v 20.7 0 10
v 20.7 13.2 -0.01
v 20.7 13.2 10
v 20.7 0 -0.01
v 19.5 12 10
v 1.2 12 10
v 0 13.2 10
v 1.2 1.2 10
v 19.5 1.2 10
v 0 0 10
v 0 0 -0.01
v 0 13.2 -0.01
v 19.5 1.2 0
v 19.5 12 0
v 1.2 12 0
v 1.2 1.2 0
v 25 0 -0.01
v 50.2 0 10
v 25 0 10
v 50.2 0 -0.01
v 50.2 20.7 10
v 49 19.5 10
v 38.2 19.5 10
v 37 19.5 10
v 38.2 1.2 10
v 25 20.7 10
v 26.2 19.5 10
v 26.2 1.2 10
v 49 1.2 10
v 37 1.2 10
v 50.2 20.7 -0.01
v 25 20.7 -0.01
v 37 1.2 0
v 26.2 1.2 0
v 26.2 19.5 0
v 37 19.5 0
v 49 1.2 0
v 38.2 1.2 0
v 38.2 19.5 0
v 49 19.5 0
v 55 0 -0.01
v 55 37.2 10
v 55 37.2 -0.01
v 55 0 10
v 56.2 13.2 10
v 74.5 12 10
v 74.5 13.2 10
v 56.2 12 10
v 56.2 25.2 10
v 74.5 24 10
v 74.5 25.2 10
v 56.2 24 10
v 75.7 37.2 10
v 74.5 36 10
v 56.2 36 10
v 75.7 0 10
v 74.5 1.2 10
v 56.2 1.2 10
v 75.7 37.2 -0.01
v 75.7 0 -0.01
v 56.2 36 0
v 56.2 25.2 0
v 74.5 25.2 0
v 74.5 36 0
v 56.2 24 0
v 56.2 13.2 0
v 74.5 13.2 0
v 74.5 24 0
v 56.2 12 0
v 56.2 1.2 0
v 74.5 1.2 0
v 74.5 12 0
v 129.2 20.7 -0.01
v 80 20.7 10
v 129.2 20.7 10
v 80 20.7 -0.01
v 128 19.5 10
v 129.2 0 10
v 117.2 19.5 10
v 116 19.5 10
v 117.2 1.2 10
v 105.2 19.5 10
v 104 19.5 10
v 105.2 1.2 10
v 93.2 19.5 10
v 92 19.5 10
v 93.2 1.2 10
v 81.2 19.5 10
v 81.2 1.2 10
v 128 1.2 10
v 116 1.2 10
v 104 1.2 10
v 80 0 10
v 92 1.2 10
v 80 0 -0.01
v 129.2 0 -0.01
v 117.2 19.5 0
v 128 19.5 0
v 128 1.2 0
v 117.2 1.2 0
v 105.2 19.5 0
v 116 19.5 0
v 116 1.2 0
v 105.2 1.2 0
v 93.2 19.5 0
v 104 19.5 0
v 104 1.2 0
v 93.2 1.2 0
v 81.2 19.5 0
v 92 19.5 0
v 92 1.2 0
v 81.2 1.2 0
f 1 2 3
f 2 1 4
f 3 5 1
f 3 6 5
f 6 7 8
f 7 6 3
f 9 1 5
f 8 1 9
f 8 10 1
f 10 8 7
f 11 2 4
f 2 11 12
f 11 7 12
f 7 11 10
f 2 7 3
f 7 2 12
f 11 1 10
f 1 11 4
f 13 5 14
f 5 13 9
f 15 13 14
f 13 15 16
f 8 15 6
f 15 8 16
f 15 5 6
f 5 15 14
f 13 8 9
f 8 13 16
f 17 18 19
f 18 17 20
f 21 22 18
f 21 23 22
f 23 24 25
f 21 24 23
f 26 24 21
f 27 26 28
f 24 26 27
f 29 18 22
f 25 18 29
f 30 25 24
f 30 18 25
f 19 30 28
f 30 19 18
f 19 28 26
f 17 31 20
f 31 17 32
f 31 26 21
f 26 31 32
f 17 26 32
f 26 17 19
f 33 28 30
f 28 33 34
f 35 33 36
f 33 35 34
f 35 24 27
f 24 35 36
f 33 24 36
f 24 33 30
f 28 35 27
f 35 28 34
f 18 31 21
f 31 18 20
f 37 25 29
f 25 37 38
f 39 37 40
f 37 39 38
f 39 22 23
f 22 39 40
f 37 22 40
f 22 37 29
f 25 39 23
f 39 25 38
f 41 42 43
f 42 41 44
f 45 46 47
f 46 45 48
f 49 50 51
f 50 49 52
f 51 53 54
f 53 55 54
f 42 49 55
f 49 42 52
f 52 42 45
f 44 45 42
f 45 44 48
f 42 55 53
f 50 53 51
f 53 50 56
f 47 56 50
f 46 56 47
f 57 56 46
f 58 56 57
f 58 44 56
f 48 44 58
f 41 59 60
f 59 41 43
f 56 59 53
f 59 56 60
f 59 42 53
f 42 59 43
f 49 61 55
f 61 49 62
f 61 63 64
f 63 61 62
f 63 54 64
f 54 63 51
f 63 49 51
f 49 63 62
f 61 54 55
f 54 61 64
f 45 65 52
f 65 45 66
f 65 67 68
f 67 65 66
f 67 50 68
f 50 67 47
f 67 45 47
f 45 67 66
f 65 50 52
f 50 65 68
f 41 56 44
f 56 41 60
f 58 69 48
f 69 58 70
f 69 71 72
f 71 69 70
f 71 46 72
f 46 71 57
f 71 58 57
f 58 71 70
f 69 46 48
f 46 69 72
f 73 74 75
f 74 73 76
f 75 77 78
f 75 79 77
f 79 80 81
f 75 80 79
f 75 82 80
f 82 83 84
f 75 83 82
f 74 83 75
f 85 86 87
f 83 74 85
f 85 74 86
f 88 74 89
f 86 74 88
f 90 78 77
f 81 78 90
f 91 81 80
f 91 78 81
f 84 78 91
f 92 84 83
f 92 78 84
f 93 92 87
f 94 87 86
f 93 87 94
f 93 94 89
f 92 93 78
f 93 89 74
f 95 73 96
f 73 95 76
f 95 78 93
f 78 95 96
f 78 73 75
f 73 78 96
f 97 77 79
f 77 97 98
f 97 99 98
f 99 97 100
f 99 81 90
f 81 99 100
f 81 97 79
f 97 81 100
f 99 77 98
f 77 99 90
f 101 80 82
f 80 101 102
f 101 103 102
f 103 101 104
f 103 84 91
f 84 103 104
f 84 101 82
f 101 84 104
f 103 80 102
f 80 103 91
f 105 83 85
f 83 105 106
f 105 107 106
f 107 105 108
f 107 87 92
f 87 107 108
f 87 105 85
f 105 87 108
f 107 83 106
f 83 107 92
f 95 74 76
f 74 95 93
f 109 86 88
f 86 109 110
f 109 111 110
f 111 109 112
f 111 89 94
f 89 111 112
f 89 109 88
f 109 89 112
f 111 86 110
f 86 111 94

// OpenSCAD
// file: ../../Base/Boxes.scad
// Fischertechnik Box Foundation
// Pre-designed Boxes

use <Constants.scad>

include <PlacementOptions.scad>

box190Width = 190;
box190Depth = 130;
box130Width = 130;
box130Depth = 95;
boxUsageHeight = 33.9;
boxWallThickness = 2.4;
boxBaseThickness = 1.0;

// getBoxWallThickness()
// Gets the wall thickness of a Fischertechnik Box

function getBoxWallThickness() = boxWallThickness;

// Gets the usable height of a fischertechnik box
function getBoxUsageHeight() = boxUsageHeight;

// Gets the thickness of the Fischertechnik box base.
function getBoxBaseThickness() = boxBaseThickness;

// Gets the usable inner space of a Box 190 as an x/y-list
function getBox190Space() = [
    box190Width - 2*getBoxWallThickness(), 
    box190Depth - 2*getBoxWallThickness() ];

// Imports the Fischertechnik empty box 130x190 mm and places it at position 0,0
// 190x130 are the outer sizes, the inner space is slightly smaller. Use getBox190Space() to get the inner sizes.
// This module needs the STL file "Fischertechnik Box 130x190.stl" in the library path.
// The box is positioned that the usable inner space is at the 0,0,0 position. The

module Box190() {
    translate([-getBoxWallThickness(),-getBoxWallThickness(),-getBoxBaseThickness()])
        import("Fischertechnik Box 130x190.stl", convexity=3);
}

// Gets the usable inner space of a Box 130 as an x/y-list
function getBox130Space() = [
    box130Width - 2*getBoxWallThickness(), 
    box130Depth - 2*getBoxWallThickness() ];

// Imports the Fischertechnik empty box 95x130 mm and places it at position 0,0
// 190x130 are the outer sizes, the inner space is slightly smaller. Use getBox190Space() to get the inner sizes.
// This module needs the STL file "Fischertechnik Box 95x130.stl" in the library path.
// The box is positioned that the usable inner space is at the 0,0,0 position. The

module Box130() {
    translate([-getBoxWallThickness(),-getBoxWallThickness(),-getBoxBaseThickness()])
        import("Fischertechnik Box 95x130.stl", convexity=3);
}

// Creates a web at the specified box walls
// corner 0 = LowerLeft, 1 = UpperLeft, 2 = UpperRight, 3 = LowerRight
// side 0 = LeftOfCorner, 1 = RightOfCorner
// distance = Distance in mm from the corner
// box = inner width and depth of the box (default: Box 190)
// webWidth = length of the web (default is 3 mms)
// webThickness = thickness of the web (default is 1 mm)

module BoxWeb(corner, side, distance, box=getBox190Space(), webWidth=3, webThickness=1.0) {
    sink = getBoxWallThickness()/2;

    width = (corner % 2 == 0) ? 
            (side == LeftOfCorner ? webWidth : webThickness) :
            (side == LeftOfCorner ? webThickness : webWidth);

    depth = (corner % 2 == 0) ? 
            (side == RightOfCorner ? webWidth : webThickness) :
            (side == RightOfCorner ? webThickness : webWidth);
    
    xDiff = corner == LowerLeft ? 
                (side == LeftOfCorner ? -sink : distance) :
            (corner == UpperLeft ?                
                (side == LeftOfCorner ? distance : -sink) :
            (corner == UpperRight ?
                (side == LeftOfCorner ? box.x-webWidth+sink : box.x-distance-webThickness) :
                (side == LeftOfCorner ? box.x-distance-webThickness: box.x-webWidth+sink)));

    yDiff = corner == LowerLeft ? 
                (side == RightOfCorner ? -sink : distance) :
            (corner == UpperLeft ?
                (side == RightOfCorner ? box.y-distance : box.y-webWidth+sink) :
            (corner == UpperRight ?
                (side == RightOfCorner ? box.y-webWidth+sink : box.y-distance) :
                (side == RightOfCorner ? distance : -sink)));
    
    translate([xDiff, yDiff, -getExcess()])
        cube([width, depth, boxUsageHeight + 2*getExcess()]);
}
// file: ../../Base/Rotation.scad
// Fischertechnik Box Foundation
// Geometry Helpers Rotation

include <PlacementOptions.scad>

// getRotatedSpace(space, rotation=NoRotation)
// Rotates the space dependent on the specified rotation

function getRotatedSpace(space, rotation=NoRotation) = [
    (rotation == Rotate90 || rotation == Rotate270) ? space.y : space.x,
    (rotation == Rotate90 || rotation == Rotate270) ? space.x : space.y
];

// Rotates the given space around the fixed left lower corner
// space = the space the children needs as width/depth list [width,depth]
// rotation = 0 Rotate0 degrees, 1 Rotate90 degrees, 2 Rotate180 degrees, 3 Rotate270 degrees (equivalent to -90)

module RotateFix(space, rotation=Rotate0) {
    dy = (rotation == Rotate0 || rotation == Rotate270) ? 0 :
        (rotation == Rotate90) ? space.x :
        space.y;
    dx = (rotation < Rotate180) ? 0 :
        (rotation == Rotate180) ? space.x :
        space.y;
    
    translate([dx, dy, 0])
        rotate([0, 0, rotations[rotation]])
            children();
}
// file: ../../Base/Alignment.scad
// Fischertechnik Box Foundation
// Geometry Helpers Alignment

include <PlacementOptions.scad>

// getAlignedX(elementWidth, spaceWidth, align=AlignRight, offset=0)
// Gets the aligned X offset of an element with the given
// width in the given space.
// elementWidth = The width of the element to positon
// spaceWidth = The space where the element should be aligned
// align = 0 AlignLeft, 1 AlignCenter, 2 AlignRight
// offset = an optional offset from the aligned position. When
// aligned left or centered, then positive values are in X direction.
// When aligned right then positive values are in negative X direction.

function getAlignedX(elementWidth, spaceWidth, align=AlignRight, offset=0) =
    (align == AlignLeft) ?
        offset :
        ((align == AlignCenter) ?
        (spaceWidth - elementWidth)/2 + offset :
        spaceWidth - offset - elementWidth);

// getAlignedY(elementDepth, spaceDepth, align=AlignTop, offset=0)
// Gets the aligned Y offset of an element with the given
// depth in the given space.
// elementDepth = The depth of the element to positon
// spaceDepth = The space where the element should be aligned
// align = 0 AlignBottom, 1 AlignCenter, 2 AlignTop
// offset = an optional offset from the aligned position. When
// aligned bottom or centered, then positive values are in Y direction.
// When aligned top then positive values are in negative Y direction.

function getAlignedY(elementDepth, spaceDepth, align=AlignTop, offset=0) =
    (align == AlignBottom) ?
        offset :
        ((align == AlignCenter) ?
        (spaceDepth - elementDepth)/2 + offset :
        spaceDepth - offset - elementDepth);
// file: ../../Base/Constants.scad
// Fischertechnik Box Foundation
// Constants

// Constant values necessary for multiple elements

// Base constants
dividerThickness = 1.2;
excess = 0.01;
fragments = 90;
tolerance = 0.8;

// Gets the thickness of a divider 
function getDividerThickness() = dividerThickness;

// Gets the excess that is used to merge walls into each other
function getExcess() = excess;

// Gets amount of fragments of a cylinder
function getFragments() = fragments;

// Gets the inner tolerance of a frame to each side
function getTolerance() = tolerance;


// Fischertechnik specific constants
axisDiameter = 4;
axisBottomDiameter = axisDiameter + 1;
standardEdgeDistance = 2.5;
standardWebDistance = 11.5;
standardCornerLength = 15;
tubeWallFactor = 1.6;

// Gets axis diameter
function getAxisDiameter() = axisDiameter;

// Gets axis bottom diameter for thicker part at the bottom
function getAxisBottomDiameter() = axisBottomDiameter;

// gets the standard distance to the wall of the box for dockable frames with webs
function getStandardEdgeDistance() = standardEdgeDistance;

// gets the standard distance of each web to the corner of the dockable frame
function getStandardWebDistance() = standardWebDistance;

// gets the standard length of the corner walls of a dockable frame
function getStandardCornerLength() = standardCornerLength;

// gets the wall thickness of a tube.
function getTubeWallThickness() = tubeWallFactor * getDividerThickness();
// file: ../../Base/PlacementOptions.scad
// Fischertechnik Box Foundation
// Placement Options

// Alignment
NoAlign = 0;
AlignLeft = 1;
AlignBottom = 2;
AlignCenter = 3;
AlignRight = 4;
AlignTop = 5;

// Element rotation degree steps
rotations = [0, -90, -180, -270];

// Rotation
NoRotation = 0;
Rotate0 = 0;
Rotate90 = 1;
Rotate180 = 2;
Rotate270 = 3;

// Docking (seen from above)
NoDock = -1;
DockLeft = 0;
DockTop = 1;
DockRight = 2;
DockCorner = 2;
DockBottom = 3;

// Web corners
LowerLeft = 0;
UpperLeft = 1;
UpperRight = 2;
LowerRight = 3;

// Web position relative to corner
LeftOfCorner = 0;
RightOfCorner = 1;
// file: ../../Elements/FrameAngleBlock10x15x15.scad
// Fischertechnik Box Library
// Frame for Angle Block 10x15x15
// 38423

use <../Base/Constants.scad>
use <../ModelBase/Simple.scad>

width = 17.5;
depth = 10;

// getFrameAngleBlock10x15x15Space
// Gets the space the count of frame angle blocks needs as width and depth (.x and .y as a list)

function getFrameAngleBlock10x15x15Space(count=1) = [
    width + getTolerance() + 2*getDividerThickness(), 
    (depth + getTolerance())*count + (count+1)*getDividerThickness()];

// FrameAngleBlock10x15x15()
// Frame for angle block 10x15x15
// 38423

module FrameAngleBlock10x15x15(count=1) {
    height = 10;
    
    step = getFrameAngleBlock10x15x15Space().y - getDividerThickness();
    end = (count-1) * step;
    
    for (yOffset = [0:step:end])
        translate([0, yOffset, 0])
            Frame([width, depth, height]);
}

// Test
color("lightgray")
FrameAngleBlock10x15x15(3);
// file: ../../Base/Deployment.scad
// Fischertechnik Box Foundation
// Geometry Helpers Deployment

use <Constants.scad>
use <Placement.scad>
use <Rotation.scad>

include <PlacementOptions.scad>

// getWidth(spaces, rotations, count, i=0)
// Gets the sum of the width of count specified spaces, including rotations for each space.
// spaces = List of spaces from which the width should be added. Used internally for DeployRow.
// rotations = specify rotations for each space to get its correct width
// count = The count of spaces from the specified spaces that should be included in the sum (for recursive call)
// i = The space index offset used to start to add (for recursive call)

function getWidth(spaces, rotations, count, i=0) = 
    (i < count) ? 
        getRotatedSpace(spaces[i], rotations[i]).x + getWidth(spaces, rotations, count, i+1) : 
        0;

// getX(spaces, rotations, distance, i)
// Calculates the X position of the space with the index i, when the spaces are placed with the given
// equal distances. Used internally for DeployRow.
// spaces = List of spaces from which the width should be added
// rotations = specify rotations for each space to get its correct width
// distance = Equal distance between each space
// i = Index of the space to get its X position for

function getX(spaces, rotations, distance, i) = 
    (i == 0) ? 
        0 :
        (getRotatedSpace(spaces[i-1], rotations[i-1]).x + distance + getX(spaces, rotations, distance, i-1));

// DeployRow(width, spaces, rotations)
// Deploys the elements in the specified width with equal distances.
// rowWidth = The width of the row in mm.
// spaces = The spaces of all elements to deploy.
// rotations = The rotations of each element: 0 Rotate0 0 degrees, 1 Rotate90 90 degrees, 
// 2 Rotate180 180 degrees, 3 Rotate270 270 degrees (equivalent to -90).

module DeployRow(rowWidth, spaces, rotations) {
    distance = (rowWidth - getWidth(spaces, rotations, len(spaces))) / (len(spaces)-1);
    
    for (i = [0:1:$children-1]) {
        x = getX(spaces, rotations, distance, i);
        translate([x, 0])
            RotateFix(spaces[i], rotations[i])
                children(i);
    }
}

// DeploySame(space, elementSpace, columns=2, rows=1, rotation=Rotate0)
// Deploys columns and rows of the specified child in the specified space with
// equal distances
// space = The space where the element copies are deployed
// elementSpace = The space the child needs
// columns = Count of elements per row
// rows = Count of rows deployed
// rotation = The rotation of the child that will be applied

module DeploySame(space, elementSpace, columns=2, rows=1, rotation=Rotate0) {
    
    elementWidth = getRotatedSpace(elementSpace, rotation).x;
    columnDistance = (space.x - columns * elementWidth) / (columns > 1 ? columns - 1 : 1);
    endColumnOffset = space.x - elementWidth;
    columnOffsetStep = elementWidth + columnDistance;
    
    elementDepth = getRotatedSpace(elementSpace, rotation).y;
    rowDistance = (space.y - rows * elementDepth) / (rows > 1 ? rows - 1 : 1);
    endRowOffset = space.y - elementDepth;
    rowOffsetStep = elementDepth + rowDistance;
    
    for (rowOffset = [0:rowOffsetStep:endRowOffset]) {
        for (columnOffset = [0:columnOffsetStep:endColumnOffset]) {
            translate([columnOffset, rowOffset])
                RotateFix(elementSpace, rotation)
                    children(0);
        }
    }
}

// getMergedRowWidth(spaces, rotations, count, i=0)
// Gets the width of the merged spaces with the specified rotations.
// Merging works all elements with two frame walls. 
// The right and left walls are merged into one single wall.
// spaces = List of spaces from which the width should be added.
// rotations = specify rotations for each space to get its correct width
// count = The count of spaces from the specified spaces that should be included in the sum (for recursive call)
// i = The space index offset used to start to add (for recursive call)

function getMergedRowWidth(spaces, rotations, count, i=0) =
    (i < count) ? 
        getRotatedSpace(spaces[i], rotations[i]).x + getWidth(spaces, rotations, count, i+1) - (i > 0 ? getDividerThickness() : 0) : 
        0;

// MergeRow(spaces, rotations, dividerThickness=0.8)
// Deploys the children so that all walls of the neighbors are merged in a single common wall.
// spaces = List of spaces of the children to get the sizes from.
// rotations = specify rotations for each space to get its correct width
// dividerThickness = Thickness of all dividers of the elements (default is 0.8)

module MergeRow(spaces, rotations, dividerThickness = getDividerThickness()) {
    for (i = [0:1:$children-1]) {
        x = getX(spaces, rotations, -getDividerThickness(), i);
        translate([x, 0, 0])
            RotateFix(spaces[i], rotations[i])
                children(i);
    }
}

// Merge(count, space, rotation, dividerThickness=0.8)
// Deploys the child count times so that all walls of the neighbors are merged in a single common wall.
// space = Space of the child to get the sizes from.
// rotation = rotation of the child to get the correct width
// dividerThickness = Thickness of all dividers of the element (default is 0.8)

module Merge(count, space, rotation, dividerThickness = getDividerThickness()) {
    x = getRotatedSpace(space, rotation).x - getDividerThickness();
    for (offset = [0:x:(count-1)*x]) {
        echo(offset);
        translate([offset, 0, 0])
            RotateFix(space, rotation)
                children(0);
    }
}
// file: ../../Base/Placement.scad
// Fischertechnik Box Foundation
// Geometry Helpers Placement

use <Constants.scad>
use <Alignment.scad>
use <Rotation.scad>
use <Boxes.scad>

include <PlacementOptions.scad>

// Place(x=0, y=0, elementSpace=[0,0], alignX=AlignLeft, alignY=AlignBottom, rotation=Rotate0, boxSpace=getBox190Space())
// Places the child at the specified position
// y = Y-Position. This is a relative position when an X aligment is specified.
// x = X-Position. This is a relative position when an Y aligment is specified.
// elementSpace = space of the element to be placed [x,y]
// alignX = -1=NoAlign, 0 AlignLeft, 1 AlignCenter, 3 AlignRight (elementSpace and boxSpace required!)
// alignY = -1=NoAlign, 2 AlignBottom, 1 AlignCenter, 4 AlignTop (elementSpace and boxSpace required!)
// rotation = 0 Rotate0 0 degrees, 1 Rotate90 90 degrees, 
// 2 Rotate180 180 degrees, 3 Rotate270 270 degrees (equivalent to -90)
// boxSpace = Inner space of the box where the placement occurs [x,y] - default is Box 190x130 inner space

module Place(x=0, y=0, elementSpace=[0,0], 
  alignX=AlignLeft, alignY=AlignBottom, 
  rotation=NoRotation, boxSpace=getBox190Space()) {

    module Position(x, y, space, rotation=Rotate0) {
        translate([x, y, 0])
            RotateFix(space, rotation)
                children(0);
    }

    space = getRotatedSpace(elementSpace, rotation);
    alignedX = getAlignedX(space.x, boxSpace.x, alignX, x);
    alignedY = getAlignedY(space.y, boxSpace.y, alignY, y);
    Position(alignedX, alignedY, elementSpace, rotation)
        children(0);
}

// Center(space=getBox130Space(), elementSpace=[0,0])
// space = Space where the children is centered. For cylinder use centered=true and no elementSpace.
// elementSpace = space of the element to be centered [x,y]

module Center(space=getBox190Space(), elementSpace=[0,0]) {
    translate([(space.x - elementSpace.x) / 2, (space.y - elementSpace.y) / 2])
        children(0);
}

// CenterHorizontal(width=0, y=0, offset=0, space=getBox130Space())
// space = Space where the children is centered. For cylinder use centered=true and no elementSpace.
// elementSpace = space of the element to be centered [x,y]

module CenterHorizontal(width=0, y=0, offset=0, space=getBox190Space()) {
    translate([(space.x - width) / 2 + offset, y])
        children(0);
}

// CenterVertical(depth=0, x=0, offset=0, space=getBox130Space())
// space = Space where the children is centered. For cylinder use centered=true and no elementSpace.
// elementSpace = space of the element to be centered [x,y]

module CenterVerticalal(depth=0, x=0, offset=0, space=getBox190Space()) {
    translate([x, (space.y - depth) / 2 + offset])
        children(0);
}
// main file
// Fischertechnik Box Foundation
// Elements
// Test FrameAngleBlock10x15x15

use <../../Base/Placement.scad>
use <../../Base/Deployment.scad>
use <../../Elements/FrameAngleBlock10x15x15.scad>

include <../../Base/PlacementOptions.scad>

FrameAngleBlock10x15x15();

Place(25, 0, elementSpace=getFrameAngleBlock10x15x15Space(2), rotation=Rotate90)
    FrameAngleBlock10x15x15(2);
    
Place(55, 0, elementSpace=getFrameAngleBlock10x15x15Space(3), rotation=Rotate180)
    FrameAngleBlock10x15x15(3);
    
Place(80, 0, elementSpace=getFrameAngleBlock10x15x15Space(4), rotation=Rotate270)
    FrameAngleBlock10x15x15(4);
